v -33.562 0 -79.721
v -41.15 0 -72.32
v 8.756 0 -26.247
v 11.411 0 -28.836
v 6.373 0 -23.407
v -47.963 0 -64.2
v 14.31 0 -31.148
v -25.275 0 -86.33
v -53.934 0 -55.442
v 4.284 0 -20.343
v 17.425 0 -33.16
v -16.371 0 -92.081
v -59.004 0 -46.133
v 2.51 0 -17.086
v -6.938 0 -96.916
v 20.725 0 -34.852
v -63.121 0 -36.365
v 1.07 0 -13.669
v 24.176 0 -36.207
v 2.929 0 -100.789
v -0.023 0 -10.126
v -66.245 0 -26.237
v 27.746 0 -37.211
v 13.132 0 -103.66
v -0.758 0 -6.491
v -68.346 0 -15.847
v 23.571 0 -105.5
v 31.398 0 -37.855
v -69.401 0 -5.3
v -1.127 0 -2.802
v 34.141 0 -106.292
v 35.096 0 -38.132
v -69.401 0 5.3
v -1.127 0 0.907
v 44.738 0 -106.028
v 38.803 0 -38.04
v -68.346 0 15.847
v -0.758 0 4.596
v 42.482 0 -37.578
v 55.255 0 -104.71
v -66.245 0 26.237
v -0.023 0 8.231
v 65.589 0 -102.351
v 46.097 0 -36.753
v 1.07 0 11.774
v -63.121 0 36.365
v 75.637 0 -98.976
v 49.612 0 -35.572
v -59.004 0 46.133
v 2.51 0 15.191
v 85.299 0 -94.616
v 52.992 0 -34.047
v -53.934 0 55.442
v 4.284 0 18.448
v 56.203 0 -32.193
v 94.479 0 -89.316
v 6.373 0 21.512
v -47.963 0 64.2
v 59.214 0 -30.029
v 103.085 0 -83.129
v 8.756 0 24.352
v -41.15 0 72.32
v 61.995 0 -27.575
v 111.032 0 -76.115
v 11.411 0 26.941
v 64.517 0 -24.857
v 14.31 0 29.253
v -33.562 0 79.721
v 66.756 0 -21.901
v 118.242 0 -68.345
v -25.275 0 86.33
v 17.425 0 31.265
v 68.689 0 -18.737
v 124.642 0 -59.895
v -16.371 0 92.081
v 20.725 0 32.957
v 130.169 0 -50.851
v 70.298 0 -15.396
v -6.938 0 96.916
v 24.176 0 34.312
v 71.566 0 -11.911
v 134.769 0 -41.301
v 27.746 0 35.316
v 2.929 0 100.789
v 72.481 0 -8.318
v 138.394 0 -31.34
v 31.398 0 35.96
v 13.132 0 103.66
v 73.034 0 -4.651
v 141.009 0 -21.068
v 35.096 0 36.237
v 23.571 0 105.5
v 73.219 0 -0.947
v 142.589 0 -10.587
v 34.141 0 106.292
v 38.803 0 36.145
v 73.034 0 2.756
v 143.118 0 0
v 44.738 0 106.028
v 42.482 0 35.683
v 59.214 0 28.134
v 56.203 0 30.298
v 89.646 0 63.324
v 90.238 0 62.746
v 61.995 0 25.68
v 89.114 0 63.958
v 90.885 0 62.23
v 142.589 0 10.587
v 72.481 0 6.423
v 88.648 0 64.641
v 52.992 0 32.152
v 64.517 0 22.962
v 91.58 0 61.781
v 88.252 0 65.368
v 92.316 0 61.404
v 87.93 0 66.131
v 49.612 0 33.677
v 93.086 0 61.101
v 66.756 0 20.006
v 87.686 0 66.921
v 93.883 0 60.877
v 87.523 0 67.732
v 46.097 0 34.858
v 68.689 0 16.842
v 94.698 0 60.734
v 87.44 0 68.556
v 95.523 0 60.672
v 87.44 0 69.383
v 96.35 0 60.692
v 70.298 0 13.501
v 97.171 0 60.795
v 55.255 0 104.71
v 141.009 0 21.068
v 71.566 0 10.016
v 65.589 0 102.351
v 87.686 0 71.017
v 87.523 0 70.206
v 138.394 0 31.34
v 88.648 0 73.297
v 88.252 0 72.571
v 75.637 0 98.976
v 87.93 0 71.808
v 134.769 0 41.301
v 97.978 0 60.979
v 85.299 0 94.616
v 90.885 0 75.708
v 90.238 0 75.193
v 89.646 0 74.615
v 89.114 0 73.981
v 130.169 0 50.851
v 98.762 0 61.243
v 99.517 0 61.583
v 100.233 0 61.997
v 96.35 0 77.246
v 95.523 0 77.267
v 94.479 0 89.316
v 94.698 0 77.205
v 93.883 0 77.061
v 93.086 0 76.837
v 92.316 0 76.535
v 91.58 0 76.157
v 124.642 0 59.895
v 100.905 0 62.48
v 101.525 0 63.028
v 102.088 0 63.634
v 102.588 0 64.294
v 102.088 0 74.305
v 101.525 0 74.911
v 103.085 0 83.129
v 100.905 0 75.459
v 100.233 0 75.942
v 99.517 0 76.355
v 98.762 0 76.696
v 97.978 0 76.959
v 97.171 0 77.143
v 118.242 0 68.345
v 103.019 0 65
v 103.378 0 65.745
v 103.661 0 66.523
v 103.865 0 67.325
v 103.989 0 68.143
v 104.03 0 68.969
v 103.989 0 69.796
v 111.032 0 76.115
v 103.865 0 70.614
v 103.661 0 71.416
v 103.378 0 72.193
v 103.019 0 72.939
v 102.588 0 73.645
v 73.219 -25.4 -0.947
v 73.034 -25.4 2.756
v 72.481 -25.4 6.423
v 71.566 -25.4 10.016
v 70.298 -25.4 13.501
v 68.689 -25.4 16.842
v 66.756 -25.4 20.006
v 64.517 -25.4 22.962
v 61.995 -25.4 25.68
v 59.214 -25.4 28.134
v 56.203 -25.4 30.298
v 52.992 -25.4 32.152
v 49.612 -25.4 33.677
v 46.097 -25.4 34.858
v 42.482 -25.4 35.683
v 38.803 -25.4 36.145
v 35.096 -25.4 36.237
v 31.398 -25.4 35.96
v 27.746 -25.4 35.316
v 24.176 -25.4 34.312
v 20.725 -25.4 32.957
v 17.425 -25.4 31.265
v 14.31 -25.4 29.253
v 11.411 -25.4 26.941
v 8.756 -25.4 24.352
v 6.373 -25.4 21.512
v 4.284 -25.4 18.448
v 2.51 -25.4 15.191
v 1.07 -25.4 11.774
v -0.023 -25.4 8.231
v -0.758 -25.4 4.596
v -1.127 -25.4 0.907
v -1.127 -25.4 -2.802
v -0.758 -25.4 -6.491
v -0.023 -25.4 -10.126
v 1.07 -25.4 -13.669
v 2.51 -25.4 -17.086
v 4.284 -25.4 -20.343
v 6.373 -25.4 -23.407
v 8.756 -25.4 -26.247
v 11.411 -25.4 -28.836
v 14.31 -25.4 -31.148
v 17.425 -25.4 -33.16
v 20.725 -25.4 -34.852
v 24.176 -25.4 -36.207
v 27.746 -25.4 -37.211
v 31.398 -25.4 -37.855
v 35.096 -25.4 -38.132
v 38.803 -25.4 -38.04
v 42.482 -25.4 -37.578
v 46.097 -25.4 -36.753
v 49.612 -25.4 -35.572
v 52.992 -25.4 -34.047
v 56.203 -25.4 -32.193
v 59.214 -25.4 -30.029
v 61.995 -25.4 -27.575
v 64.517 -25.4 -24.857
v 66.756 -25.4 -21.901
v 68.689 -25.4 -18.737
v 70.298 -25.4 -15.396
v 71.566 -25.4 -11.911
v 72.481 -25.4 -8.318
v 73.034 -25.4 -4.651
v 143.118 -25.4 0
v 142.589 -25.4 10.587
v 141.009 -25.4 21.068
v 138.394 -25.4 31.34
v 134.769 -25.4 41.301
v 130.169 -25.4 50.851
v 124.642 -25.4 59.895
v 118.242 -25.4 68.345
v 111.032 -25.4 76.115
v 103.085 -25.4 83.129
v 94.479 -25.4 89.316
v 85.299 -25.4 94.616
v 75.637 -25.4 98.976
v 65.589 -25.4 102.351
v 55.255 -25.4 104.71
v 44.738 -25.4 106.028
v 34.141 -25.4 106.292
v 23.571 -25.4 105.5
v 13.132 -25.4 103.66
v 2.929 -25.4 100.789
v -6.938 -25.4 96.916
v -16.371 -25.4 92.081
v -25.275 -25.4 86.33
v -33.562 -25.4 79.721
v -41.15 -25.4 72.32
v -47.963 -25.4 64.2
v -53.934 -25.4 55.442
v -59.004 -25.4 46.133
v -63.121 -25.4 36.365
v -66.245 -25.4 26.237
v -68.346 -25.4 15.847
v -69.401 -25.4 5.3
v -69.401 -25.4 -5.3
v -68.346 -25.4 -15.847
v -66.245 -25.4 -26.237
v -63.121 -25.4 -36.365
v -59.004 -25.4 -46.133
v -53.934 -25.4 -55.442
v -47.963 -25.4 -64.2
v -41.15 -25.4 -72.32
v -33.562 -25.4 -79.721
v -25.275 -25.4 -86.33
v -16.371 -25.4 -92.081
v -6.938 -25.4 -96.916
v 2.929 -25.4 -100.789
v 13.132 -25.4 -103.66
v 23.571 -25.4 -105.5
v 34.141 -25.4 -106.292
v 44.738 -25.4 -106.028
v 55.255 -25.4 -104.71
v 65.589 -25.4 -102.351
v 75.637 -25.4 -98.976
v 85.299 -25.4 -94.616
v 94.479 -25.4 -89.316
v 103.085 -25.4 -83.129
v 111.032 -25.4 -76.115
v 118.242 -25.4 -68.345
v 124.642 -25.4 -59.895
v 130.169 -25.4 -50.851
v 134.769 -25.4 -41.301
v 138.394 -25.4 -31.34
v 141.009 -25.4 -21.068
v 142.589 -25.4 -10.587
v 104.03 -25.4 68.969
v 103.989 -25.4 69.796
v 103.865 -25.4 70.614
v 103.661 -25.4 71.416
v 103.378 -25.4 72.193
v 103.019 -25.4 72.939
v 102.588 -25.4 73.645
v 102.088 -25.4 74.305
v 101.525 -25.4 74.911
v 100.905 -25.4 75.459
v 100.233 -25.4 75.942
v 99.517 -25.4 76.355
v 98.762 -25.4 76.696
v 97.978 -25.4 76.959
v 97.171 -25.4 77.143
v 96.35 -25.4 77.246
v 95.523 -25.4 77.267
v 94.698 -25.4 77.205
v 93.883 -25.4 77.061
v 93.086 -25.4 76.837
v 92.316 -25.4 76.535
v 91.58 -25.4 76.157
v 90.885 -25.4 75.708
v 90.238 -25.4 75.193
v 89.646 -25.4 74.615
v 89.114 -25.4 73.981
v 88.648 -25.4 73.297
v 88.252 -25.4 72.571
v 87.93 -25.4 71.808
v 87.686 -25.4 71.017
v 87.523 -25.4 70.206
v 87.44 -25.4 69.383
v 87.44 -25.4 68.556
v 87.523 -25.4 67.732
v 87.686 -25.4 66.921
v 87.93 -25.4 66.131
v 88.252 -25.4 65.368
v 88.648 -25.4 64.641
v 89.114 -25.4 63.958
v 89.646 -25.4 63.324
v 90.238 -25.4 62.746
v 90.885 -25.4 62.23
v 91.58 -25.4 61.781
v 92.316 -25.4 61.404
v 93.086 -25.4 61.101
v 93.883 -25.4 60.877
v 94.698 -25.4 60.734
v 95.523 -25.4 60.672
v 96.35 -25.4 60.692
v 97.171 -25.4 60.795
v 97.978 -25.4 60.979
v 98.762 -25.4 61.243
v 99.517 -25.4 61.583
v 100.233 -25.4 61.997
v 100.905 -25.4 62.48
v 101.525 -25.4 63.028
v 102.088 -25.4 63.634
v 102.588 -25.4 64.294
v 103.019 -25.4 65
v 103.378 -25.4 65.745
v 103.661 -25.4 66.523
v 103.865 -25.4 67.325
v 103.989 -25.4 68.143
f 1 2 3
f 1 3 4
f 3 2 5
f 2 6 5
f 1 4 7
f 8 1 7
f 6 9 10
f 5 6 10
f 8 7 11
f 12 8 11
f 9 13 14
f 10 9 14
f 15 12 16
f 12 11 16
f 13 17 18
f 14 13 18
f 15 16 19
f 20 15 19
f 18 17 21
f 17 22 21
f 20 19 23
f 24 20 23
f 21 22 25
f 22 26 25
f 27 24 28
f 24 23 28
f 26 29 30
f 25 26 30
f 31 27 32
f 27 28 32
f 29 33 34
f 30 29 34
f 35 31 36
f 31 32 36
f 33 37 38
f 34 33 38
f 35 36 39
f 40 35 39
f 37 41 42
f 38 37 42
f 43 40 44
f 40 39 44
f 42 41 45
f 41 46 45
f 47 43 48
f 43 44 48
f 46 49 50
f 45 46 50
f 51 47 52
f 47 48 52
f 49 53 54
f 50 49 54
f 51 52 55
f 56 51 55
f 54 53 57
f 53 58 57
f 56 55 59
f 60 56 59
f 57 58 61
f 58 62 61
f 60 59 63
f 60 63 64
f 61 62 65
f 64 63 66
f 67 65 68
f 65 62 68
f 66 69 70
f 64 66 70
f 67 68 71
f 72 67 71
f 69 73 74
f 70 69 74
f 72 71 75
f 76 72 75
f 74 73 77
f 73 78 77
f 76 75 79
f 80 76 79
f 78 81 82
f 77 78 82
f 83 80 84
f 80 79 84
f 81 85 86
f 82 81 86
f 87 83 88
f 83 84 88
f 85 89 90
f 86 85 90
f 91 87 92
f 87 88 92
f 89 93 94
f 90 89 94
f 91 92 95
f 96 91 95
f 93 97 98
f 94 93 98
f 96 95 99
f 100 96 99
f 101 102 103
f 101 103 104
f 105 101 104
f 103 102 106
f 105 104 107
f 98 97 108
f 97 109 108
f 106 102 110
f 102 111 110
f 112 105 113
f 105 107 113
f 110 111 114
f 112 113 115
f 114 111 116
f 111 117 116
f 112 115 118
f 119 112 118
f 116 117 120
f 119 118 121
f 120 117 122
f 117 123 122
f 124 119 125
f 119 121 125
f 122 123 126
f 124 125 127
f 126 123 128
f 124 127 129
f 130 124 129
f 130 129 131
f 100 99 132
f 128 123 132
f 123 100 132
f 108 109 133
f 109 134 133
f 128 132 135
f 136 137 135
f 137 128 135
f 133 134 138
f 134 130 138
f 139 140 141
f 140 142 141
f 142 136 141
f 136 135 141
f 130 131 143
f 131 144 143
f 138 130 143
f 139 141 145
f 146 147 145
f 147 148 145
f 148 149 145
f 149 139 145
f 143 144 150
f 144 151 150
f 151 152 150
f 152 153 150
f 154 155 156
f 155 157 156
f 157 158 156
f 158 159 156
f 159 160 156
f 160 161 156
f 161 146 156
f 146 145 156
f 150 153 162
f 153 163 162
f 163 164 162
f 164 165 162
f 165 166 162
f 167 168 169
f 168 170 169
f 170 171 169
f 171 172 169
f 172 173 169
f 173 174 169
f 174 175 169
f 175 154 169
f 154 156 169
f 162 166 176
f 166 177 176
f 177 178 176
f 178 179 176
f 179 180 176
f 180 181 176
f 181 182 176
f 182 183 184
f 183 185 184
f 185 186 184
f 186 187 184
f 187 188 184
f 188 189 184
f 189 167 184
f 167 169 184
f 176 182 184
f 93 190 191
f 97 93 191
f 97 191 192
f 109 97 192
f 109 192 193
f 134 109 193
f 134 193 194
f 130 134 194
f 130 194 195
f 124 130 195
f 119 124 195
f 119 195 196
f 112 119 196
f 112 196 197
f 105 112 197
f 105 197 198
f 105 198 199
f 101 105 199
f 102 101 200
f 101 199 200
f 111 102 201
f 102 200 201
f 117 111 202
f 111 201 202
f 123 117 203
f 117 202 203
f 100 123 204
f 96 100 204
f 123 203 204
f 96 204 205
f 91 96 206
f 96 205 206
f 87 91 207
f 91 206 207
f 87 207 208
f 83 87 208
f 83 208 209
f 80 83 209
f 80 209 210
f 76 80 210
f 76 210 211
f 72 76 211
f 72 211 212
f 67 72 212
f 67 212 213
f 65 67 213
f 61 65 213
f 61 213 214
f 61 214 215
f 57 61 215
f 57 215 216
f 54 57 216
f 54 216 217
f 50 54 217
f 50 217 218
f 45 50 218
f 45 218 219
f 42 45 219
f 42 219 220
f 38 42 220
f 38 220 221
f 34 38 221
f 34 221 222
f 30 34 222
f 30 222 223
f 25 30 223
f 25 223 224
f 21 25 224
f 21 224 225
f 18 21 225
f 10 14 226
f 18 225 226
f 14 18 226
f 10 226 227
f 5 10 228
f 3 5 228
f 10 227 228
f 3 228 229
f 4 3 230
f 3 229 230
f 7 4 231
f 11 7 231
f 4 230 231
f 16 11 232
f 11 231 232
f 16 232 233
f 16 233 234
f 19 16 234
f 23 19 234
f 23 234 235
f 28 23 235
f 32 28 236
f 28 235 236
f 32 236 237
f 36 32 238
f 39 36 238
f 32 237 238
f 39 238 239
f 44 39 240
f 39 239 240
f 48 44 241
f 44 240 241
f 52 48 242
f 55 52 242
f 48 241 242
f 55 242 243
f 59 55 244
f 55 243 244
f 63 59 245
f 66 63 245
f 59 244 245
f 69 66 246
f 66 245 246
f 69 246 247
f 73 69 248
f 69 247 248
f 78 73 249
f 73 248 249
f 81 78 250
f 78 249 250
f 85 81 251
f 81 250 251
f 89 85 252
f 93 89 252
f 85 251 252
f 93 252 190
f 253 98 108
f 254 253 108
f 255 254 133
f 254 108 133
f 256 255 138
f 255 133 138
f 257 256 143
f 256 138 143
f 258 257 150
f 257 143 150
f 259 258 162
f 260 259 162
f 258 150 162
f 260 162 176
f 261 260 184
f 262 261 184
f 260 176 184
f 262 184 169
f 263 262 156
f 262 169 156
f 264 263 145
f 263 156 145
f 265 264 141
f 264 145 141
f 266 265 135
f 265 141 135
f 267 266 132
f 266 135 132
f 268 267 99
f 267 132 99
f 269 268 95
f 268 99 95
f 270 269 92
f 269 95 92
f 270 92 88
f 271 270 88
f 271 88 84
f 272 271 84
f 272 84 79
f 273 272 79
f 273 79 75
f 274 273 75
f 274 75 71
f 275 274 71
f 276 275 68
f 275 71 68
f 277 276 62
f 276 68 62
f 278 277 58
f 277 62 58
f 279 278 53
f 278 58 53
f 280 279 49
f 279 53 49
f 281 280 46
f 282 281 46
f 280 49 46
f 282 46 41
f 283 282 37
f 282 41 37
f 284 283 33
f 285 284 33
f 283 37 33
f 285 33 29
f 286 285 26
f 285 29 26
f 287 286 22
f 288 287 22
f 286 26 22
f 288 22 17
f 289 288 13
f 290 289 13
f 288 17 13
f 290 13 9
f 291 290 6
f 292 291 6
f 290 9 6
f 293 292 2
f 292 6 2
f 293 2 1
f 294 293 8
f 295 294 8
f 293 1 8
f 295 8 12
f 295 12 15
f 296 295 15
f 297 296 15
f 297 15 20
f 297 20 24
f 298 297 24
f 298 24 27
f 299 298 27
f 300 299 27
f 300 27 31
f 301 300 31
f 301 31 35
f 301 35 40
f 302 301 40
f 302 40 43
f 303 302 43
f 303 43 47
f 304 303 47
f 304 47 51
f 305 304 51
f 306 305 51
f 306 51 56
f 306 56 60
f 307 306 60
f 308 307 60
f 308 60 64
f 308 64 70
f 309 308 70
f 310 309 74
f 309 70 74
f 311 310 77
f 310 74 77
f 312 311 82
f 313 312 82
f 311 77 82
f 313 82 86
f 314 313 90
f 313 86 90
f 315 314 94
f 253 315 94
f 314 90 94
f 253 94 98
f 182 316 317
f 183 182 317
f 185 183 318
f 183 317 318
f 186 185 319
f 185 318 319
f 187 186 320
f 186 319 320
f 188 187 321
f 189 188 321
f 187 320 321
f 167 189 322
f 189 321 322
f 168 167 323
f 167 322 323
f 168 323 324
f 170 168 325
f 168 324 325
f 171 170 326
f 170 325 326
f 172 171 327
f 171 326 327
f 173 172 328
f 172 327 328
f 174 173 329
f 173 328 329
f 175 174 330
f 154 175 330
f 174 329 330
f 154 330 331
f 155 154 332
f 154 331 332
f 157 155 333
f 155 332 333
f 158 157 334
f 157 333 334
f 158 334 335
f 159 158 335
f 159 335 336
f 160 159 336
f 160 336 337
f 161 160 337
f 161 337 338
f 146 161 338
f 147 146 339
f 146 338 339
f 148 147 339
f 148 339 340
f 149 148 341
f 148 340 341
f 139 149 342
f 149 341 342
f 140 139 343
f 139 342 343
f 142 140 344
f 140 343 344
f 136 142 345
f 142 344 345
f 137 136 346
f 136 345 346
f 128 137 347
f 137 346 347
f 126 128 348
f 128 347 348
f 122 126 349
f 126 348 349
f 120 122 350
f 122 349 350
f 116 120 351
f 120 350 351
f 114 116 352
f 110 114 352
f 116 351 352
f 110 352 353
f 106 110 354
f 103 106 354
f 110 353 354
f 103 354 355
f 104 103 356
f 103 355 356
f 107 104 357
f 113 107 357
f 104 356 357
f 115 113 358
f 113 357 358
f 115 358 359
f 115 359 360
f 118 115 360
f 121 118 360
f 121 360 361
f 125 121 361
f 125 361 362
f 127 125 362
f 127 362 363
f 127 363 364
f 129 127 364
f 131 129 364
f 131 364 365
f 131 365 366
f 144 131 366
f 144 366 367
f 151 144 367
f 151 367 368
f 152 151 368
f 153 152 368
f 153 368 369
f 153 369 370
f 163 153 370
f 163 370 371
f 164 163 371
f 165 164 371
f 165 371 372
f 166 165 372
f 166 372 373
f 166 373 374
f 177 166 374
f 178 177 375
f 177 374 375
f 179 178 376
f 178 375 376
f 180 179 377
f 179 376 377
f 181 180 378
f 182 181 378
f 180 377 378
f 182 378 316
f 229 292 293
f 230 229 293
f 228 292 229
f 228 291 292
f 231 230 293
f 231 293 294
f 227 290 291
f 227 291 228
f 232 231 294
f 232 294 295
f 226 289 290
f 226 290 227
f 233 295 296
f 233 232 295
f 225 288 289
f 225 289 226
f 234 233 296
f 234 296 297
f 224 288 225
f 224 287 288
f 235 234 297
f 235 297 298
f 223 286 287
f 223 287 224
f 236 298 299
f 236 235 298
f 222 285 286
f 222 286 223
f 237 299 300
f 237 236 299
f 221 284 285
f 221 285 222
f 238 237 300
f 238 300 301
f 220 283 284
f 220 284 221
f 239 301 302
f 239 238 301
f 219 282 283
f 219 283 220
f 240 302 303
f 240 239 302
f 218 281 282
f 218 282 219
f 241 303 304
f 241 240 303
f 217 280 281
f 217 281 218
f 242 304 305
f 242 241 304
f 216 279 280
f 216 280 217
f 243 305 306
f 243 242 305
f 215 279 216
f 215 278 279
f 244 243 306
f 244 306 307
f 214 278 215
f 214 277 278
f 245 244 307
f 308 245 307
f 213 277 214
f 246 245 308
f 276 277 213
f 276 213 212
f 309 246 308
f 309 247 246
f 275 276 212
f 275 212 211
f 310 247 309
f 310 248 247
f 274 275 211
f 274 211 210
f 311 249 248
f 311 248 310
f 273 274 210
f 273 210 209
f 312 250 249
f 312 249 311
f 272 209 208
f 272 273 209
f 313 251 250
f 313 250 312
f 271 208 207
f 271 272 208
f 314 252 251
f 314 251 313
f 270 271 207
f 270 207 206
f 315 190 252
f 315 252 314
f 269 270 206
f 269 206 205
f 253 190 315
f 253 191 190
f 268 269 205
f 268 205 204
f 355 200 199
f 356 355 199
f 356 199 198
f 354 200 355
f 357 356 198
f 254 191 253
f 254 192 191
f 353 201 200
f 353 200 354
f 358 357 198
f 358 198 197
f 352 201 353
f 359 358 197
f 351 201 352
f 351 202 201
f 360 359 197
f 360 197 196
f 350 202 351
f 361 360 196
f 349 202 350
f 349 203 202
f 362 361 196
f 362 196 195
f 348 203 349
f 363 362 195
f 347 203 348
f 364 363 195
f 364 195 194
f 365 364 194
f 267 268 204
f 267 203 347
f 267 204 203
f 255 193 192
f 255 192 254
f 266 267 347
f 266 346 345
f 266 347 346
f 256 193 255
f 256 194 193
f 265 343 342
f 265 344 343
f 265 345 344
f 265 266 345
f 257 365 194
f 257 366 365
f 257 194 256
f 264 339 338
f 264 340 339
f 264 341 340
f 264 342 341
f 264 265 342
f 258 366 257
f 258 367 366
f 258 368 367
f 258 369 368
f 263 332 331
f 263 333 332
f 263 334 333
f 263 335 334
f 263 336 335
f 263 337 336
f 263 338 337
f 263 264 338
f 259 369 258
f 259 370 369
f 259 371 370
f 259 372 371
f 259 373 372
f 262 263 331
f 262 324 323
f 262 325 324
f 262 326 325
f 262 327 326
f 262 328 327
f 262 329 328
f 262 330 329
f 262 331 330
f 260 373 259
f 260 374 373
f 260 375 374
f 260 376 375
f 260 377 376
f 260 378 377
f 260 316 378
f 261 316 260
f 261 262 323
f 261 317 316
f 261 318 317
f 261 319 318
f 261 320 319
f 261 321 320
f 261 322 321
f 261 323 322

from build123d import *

# Parameters (mm, degrees)
F0_R     = 106.32546
F1_DEPTH = 25.4
F3_R     = 37.196049
F4_DEPTH = 25.401
F5_R     = 8.300114
F6_DEPTH = 25.4


with BuildPart() as f1:
    # F0 (on Front) → F1 (new body)
    with BuildSketch(Plane.XZ):
        with Locations((36.792137, 0)):
            Circle(F0_R)
    extrude(amount=F1_DEPTH)

    # F3 (on face) → F4 (cut, through all)
    with BuildSketch(Plane.XZ.offset(25.4)):
        with Locations((36.022916, -0.947487)):
            Circle(F3_R)
    extrude(amount=-F4_DEPTH, mode=Mode.SUBTRACT)

    # F5 (on face) → F6 (cut)
    with BuildSketch(Plane.XZ.offset(25.4)):
        with Locations((95.72994, 68.969317)):
            Circle(F5_R)
    extrude(amount=-F6_DEPTH, mode=Mode.SUBTRACT)


solid = f1.part
